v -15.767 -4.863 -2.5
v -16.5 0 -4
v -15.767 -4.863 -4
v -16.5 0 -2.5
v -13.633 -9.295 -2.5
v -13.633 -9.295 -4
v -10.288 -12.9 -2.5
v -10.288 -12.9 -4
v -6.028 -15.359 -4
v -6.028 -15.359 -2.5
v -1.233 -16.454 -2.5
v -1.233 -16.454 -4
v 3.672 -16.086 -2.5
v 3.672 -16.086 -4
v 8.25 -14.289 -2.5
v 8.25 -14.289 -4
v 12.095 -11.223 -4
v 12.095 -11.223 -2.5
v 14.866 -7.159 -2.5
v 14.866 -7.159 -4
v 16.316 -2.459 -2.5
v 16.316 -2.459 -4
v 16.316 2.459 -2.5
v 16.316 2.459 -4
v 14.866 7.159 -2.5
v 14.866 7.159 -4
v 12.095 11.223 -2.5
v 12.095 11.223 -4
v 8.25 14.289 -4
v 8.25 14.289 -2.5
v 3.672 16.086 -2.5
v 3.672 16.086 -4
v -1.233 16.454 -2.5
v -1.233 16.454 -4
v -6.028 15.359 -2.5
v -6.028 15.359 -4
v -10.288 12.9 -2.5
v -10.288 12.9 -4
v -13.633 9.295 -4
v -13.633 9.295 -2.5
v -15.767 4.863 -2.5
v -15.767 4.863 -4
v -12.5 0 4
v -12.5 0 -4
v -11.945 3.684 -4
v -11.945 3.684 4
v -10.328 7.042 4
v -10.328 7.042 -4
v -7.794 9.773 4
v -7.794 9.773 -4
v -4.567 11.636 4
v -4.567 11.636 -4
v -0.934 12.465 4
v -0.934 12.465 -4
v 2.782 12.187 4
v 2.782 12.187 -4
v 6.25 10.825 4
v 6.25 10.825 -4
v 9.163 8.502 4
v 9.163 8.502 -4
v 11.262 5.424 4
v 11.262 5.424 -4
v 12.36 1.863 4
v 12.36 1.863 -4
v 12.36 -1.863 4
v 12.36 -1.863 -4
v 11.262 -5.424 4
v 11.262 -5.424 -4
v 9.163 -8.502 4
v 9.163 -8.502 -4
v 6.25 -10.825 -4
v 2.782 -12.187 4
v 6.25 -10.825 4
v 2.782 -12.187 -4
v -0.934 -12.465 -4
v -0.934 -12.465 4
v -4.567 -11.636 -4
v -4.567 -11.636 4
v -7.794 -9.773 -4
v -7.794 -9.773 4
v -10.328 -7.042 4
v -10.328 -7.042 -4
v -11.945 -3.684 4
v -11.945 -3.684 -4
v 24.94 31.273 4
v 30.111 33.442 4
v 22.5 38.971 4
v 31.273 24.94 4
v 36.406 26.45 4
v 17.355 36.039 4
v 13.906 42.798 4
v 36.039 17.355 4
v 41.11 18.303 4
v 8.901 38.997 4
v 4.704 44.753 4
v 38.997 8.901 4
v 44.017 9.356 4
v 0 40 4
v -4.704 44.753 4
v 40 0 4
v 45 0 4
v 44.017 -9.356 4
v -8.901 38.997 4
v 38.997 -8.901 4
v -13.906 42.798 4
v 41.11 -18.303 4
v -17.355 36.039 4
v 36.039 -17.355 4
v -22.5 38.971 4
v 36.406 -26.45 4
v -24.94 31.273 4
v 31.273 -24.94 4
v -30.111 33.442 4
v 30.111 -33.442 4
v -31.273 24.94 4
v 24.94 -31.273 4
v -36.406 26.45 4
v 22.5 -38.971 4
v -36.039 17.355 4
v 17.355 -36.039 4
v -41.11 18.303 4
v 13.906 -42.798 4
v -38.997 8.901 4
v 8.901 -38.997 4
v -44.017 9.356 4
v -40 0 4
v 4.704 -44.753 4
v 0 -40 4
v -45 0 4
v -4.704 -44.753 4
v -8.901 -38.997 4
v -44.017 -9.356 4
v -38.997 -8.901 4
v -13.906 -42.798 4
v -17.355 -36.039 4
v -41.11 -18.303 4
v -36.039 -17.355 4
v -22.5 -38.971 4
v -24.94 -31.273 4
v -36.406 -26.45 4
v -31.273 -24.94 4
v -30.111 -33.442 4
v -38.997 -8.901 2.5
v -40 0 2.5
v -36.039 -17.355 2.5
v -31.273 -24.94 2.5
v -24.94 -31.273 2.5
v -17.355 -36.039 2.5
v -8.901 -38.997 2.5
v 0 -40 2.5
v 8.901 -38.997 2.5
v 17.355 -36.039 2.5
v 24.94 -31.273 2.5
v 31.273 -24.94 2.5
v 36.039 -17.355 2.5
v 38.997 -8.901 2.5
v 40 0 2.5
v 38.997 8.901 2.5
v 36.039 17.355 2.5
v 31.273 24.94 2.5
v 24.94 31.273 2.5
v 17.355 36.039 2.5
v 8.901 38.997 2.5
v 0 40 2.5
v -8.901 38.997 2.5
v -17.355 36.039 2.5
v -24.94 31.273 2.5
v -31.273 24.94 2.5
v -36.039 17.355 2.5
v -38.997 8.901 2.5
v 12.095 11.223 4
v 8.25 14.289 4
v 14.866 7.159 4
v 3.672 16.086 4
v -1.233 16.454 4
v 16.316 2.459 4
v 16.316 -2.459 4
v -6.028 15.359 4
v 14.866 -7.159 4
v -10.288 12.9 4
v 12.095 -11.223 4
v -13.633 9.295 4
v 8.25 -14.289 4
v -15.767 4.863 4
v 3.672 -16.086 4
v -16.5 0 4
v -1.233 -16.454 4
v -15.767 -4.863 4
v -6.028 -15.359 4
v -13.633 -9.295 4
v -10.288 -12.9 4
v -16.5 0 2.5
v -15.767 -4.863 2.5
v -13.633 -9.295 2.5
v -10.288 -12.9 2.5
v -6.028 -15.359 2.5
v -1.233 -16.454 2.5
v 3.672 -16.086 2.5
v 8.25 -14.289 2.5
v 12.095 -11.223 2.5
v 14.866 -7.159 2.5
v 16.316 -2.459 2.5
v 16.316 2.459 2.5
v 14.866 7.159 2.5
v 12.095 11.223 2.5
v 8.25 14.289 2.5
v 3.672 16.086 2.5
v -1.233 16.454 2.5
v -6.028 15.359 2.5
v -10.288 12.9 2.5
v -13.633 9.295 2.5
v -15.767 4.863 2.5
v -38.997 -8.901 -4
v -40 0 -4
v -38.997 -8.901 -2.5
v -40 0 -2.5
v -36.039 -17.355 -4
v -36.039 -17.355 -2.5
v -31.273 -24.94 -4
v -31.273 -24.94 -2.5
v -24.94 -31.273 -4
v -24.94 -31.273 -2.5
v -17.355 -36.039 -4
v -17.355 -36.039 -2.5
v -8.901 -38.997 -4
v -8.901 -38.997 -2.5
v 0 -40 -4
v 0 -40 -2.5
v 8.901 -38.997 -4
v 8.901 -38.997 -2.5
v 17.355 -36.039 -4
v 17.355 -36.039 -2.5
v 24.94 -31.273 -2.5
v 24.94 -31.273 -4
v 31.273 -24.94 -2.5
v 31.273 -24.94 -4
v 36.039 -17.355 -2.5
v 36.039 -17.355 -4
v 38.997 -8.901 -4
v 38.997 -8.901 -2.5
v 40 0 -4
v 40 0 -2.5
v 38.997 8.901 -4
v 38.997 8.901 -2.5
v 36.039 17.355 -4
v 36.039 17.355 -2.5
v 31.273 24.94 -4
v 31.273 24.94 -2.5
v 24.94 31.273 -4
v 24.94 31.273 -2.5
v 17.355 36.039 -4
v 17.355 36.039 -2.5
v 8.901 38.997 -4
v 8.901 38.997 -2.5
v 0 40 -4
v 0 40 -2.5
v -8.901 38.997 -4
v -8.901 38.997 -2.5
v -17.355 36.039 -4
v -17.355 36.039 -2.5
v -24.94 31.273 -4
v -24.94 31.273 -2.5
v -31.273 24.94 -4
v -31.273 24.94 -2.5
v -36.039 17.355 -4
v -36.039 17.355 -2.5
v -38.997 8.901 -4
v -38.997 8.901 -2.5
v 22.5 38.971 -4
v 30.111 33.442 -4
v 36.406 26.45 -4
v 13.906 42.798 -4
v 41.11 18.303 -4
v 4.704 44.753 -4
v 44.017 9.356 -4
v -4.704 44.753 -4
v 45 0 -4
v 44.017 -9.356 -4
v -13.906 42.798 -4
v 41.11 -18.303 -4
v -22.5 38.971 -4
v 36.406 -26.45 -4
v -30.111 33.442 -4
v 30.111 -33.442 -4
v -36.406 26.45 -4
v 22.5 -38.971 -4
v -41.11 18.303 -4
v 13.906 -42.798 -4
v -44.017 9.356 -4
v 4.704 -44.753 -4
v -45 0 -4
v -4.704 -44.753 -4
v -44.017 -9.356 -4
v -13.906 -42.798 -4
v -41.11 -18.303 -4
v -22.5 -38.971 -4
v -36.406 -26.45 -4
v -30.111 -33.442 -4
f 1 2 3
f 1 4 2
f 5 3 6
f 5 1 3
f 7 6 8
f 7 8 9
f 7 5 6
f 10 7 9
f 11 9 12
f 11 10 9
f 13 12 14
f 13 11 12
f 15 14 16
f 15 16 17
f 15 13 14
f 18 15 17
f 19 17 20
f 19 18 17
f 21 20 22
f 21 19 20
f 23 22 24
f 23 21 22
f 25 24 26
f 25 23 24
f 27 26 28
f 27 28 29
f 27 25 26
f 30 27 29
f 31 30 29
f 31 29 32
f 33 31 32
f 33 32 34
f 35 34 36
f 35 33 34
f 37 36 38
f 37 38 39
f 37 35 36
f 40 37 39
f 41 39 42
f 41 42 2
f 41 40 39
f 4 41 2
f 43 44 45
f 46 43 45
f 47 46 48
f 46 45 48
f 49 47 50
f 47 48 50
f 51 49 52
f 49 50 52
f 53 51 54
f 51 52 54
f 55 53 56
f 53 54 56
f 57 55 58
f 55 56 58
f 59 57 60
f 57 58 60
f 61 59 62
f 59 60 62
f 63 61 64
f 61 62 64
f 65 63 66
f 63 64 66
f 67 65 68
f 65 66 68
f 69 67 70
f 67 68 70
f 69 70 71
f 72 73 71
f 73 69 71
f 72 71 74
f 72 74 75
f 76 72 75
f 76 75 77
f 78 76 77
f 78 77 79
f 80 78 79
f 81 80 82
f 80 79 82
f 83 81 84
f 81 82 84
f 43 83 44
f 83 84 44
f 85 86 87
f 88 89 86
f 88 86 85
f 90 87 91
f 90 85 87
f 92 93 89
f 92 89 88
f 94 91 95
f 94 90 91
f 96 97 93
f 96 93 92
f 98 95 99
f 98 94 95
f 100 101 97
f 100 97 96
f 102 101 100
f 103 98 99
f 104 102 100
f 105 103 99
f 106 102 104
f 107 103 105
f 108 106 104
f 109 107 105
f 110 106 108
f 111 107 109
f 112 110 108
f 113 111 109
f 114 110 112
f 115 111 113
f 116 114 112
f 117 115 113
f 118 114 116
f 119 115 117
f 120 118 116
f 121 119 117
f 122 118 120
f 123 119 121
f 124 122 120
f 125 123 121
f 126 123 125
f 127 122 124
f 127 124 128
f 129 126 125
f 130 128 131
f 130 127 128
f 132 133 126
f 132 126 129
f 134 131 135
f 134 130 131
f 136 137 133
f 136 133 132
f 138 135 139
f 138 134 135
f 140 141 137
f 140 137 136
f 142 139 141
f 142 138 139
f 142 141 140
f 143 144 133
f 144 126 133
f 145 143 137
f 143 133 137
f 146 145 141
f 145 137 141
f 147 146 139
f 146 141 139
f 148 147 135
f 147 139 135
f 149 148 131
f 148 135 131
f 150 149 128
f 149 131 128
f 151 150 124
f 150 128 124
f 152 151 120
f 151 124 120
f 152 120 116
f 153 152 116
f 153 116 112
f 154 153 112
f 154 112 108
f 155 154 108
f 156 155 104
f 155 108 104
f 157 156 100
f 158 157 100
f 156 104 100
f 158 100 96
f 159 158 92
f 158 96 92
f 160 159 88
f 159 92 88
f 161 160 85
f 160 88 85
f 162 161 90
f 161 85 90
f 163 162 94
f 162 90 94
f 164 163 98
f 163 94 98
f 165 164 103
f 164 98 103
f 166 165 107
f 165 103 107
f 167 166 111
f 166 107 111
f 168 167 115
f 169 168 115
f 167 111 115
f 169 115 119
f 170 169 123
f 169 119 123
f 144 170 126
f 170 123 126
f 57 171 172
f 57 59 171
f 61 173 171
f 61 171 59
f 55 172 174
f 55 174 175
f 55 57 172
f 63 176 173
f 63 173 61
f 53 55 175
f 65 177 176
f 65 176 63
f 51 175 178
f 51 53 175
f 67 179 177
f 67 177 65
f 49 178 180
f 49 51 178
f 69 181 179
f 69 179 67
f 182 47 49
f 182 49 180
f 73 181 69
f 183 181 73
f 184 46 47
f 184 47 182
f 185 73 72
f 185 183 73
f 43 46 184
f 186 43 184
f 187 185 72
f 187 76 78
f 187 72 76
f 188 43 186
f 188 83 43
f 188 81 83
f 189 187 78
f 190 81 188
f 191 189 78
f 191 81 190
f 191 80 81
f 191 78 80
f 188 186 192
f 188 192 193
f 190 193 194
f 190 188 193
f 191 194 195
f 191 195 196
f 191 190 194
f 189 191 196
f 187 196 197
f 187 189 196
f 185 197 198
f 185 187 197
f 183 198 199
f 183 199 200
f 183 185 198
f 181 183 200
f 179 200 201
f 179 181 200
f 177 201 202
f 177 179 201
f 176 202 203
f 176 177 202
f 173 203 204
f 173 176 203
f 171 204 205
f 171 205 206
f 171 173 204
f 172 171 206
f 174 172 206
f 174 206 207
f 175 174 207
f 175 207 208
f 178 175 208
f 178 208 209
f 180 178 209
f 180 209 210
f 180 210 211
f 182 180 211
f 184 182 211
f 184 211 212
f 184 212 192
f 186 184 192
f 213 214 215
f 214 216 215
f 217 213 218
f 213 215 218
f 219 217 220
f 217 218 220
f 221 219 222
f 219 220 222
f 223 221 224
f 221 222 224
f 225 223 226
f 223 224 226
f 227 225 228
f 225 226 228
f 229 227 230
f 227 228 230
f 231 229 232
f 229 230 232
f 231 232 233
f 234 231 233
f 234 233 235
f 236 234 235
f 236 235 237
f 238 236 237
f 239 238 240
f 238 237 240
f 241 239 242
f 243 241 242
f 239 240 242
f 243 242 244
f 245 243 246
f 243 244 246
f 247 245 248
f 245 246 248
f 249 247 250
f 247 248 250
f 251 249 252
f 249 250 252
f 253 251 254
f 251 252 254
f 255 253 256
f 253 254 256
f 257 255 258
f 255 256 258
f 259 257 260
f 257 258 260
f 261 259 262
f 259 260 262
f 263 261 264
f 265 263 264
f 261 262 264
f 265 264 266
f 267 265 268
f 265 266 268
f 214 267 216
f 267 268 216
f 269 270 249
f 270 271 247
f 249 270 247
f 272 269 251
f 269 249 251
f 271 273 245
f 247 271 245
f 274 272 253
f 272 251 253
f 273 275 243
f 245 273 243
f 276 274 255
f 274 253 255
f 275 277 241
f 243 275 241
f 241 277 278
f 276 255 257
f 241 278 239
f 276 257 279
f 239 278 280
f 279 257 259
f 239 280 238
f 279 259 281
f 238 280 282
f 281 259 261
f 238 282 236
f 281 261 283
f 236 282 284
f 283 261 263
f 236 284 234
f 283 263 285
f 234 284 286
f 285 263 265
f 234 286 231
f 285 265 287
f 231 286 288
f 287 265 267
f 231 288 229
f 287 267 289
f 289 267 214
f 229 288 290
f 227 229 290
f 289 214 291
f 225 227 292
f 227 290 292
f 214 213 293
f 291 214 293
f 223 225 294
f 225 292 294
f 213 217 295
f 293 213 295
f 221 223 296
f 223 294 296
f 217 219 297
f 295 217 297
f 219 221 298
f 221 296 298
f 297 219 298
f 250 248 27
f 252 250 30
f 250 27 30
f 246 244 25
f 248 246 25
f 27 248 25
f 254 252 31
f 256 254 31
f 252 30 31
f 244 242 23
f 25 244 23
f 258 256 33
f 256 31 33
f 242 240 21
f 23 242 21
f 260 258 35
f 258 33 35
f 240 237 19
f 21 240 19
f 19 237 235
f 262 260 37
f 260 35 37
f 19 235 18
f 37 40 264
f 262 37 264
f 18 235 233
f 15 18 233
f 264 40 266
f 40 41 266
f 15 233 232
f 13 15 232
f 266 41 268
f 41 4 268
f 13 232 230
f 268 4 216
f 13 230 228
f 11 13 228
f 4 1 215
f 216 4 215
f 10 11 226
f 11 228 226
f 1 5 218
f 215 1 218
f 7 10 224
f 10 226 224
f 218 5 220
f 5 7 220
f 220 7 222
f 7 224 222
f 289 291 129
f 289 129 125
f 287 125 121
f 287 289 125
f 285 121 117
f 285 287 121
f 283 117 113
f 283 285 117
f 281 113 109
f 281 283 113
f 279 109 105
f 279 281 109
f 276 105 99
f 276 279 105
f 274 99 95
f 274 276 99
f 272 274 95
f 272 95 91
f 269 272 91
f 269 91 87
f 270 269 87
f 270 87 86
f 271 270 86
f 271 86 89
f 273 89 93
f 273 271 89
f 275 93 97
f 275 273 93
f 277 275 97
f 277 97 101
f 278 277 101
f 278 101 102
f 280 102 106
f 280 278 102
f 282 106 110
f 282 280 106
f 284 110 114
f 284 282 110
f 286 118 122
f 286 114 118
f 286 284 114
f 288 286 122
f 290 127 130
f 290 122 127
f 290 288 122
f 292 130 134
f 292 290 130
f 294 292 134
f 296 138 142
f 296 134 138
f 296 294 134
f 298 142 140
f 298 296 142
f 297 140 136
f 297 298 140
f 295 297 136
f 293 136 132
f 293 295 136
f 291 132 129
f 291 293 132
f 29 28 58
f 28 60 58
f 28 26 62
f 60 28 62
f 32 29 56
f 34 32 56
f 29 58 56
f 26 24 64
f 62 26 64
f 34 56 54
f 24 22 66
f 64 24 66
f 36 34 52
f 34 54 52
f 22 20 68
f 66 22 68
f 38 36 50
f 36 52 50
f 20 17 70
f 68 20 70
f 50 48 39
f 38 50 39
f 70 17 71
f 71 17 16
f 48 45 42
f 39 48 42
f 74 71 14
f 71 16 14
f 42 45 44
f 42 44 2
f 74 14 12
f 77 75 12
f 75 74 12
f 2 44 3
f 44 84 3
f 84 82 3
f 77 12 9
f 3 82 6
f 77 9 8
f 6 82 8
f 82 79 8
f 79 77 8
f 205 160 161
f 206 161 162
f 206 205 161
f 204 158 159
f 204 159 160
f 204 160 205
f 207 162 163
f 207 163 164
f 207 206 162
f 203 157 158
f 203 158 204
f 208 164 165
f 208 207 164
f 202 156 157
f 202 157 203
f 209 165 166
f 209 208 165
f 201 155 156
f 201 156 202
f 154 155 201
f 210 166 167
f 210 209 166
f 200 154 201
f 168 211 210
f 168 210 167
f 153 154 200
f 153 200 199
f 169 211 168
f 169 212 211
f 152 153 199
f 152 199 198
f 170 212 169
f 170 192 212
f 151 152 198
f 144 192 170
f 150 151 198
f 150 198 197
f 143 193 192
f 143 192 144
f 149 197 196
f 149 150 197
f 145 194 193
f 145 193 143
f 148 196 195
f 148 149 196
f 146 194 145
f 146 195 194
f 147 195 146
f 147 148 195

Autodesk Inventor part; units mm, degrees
ref_plane "YZ Plane" through (0, 0, 0) normal (1, 0, 0) x (0, 1, 0)
ref_plane "XZ Plane" through (0, 0, 0) normal (0, 1, 0) x (-1, 0, 0)
ref_plane "XY Plane" through (0, 0, 0) normal (0, 0, 1) x (1, 0, 0)
sketch "Sketch1" plane through (0, 0, 0) normal (0, 1, 0) x (-1, 0, 0)
  line L0 (16.5, 4) -> (12.5, 4)
  line L1 (12.5, 4) -> (12.5, -4)
  line L2 (12.5, -4) -> (16.5, -4)
  line L3 (16.5, -2.5) -> (40, -2.5)
  line L4 (40, 2.5) -> (16.5, 2.5)
  line L5 (40, 4) -> (45, 4)
  line L6 (45, 4) -> (45, -4)
  line L7 (45, -4) -> (40, -4)
  line L8 (16.5, 2.5) -> (16.5, 4)
  line L9 (16.5, -4) -> (16.5, -2.5)
  line L10 (40, -4) -> (40, -2.5)
  line L11 (40, 2.5) -> (40, 4)
  line L12 (0, -5.6) -> (0, 5.6) projected
  line L13 (45, 4) -> (12.5, -4) construction
  line L14 (45, -4) -> (12.5, 4) construction
  point P0 (0, 0)
  point P1 (45, 0)
  point P2 (28.75, 0)
  point P3 (40, 2)
  point P4 (16.5, -2)
  point P5 (40, -2)
  point P6 (16.5, 2)
  dimension "d1" = 90
  dimension "d2" = 5
  dimension "d3" = 4
  dimension "d4" = 25
  dimension "d5" = 8
  dimension "d7" = 1.5
revolve "Revolution1" add sketch "Sketch1" angle 360 about axis through (0, 0, -10) along (0, 0, 1)
properties part number "Counterweight (500g)" material "Steel, Cast"
